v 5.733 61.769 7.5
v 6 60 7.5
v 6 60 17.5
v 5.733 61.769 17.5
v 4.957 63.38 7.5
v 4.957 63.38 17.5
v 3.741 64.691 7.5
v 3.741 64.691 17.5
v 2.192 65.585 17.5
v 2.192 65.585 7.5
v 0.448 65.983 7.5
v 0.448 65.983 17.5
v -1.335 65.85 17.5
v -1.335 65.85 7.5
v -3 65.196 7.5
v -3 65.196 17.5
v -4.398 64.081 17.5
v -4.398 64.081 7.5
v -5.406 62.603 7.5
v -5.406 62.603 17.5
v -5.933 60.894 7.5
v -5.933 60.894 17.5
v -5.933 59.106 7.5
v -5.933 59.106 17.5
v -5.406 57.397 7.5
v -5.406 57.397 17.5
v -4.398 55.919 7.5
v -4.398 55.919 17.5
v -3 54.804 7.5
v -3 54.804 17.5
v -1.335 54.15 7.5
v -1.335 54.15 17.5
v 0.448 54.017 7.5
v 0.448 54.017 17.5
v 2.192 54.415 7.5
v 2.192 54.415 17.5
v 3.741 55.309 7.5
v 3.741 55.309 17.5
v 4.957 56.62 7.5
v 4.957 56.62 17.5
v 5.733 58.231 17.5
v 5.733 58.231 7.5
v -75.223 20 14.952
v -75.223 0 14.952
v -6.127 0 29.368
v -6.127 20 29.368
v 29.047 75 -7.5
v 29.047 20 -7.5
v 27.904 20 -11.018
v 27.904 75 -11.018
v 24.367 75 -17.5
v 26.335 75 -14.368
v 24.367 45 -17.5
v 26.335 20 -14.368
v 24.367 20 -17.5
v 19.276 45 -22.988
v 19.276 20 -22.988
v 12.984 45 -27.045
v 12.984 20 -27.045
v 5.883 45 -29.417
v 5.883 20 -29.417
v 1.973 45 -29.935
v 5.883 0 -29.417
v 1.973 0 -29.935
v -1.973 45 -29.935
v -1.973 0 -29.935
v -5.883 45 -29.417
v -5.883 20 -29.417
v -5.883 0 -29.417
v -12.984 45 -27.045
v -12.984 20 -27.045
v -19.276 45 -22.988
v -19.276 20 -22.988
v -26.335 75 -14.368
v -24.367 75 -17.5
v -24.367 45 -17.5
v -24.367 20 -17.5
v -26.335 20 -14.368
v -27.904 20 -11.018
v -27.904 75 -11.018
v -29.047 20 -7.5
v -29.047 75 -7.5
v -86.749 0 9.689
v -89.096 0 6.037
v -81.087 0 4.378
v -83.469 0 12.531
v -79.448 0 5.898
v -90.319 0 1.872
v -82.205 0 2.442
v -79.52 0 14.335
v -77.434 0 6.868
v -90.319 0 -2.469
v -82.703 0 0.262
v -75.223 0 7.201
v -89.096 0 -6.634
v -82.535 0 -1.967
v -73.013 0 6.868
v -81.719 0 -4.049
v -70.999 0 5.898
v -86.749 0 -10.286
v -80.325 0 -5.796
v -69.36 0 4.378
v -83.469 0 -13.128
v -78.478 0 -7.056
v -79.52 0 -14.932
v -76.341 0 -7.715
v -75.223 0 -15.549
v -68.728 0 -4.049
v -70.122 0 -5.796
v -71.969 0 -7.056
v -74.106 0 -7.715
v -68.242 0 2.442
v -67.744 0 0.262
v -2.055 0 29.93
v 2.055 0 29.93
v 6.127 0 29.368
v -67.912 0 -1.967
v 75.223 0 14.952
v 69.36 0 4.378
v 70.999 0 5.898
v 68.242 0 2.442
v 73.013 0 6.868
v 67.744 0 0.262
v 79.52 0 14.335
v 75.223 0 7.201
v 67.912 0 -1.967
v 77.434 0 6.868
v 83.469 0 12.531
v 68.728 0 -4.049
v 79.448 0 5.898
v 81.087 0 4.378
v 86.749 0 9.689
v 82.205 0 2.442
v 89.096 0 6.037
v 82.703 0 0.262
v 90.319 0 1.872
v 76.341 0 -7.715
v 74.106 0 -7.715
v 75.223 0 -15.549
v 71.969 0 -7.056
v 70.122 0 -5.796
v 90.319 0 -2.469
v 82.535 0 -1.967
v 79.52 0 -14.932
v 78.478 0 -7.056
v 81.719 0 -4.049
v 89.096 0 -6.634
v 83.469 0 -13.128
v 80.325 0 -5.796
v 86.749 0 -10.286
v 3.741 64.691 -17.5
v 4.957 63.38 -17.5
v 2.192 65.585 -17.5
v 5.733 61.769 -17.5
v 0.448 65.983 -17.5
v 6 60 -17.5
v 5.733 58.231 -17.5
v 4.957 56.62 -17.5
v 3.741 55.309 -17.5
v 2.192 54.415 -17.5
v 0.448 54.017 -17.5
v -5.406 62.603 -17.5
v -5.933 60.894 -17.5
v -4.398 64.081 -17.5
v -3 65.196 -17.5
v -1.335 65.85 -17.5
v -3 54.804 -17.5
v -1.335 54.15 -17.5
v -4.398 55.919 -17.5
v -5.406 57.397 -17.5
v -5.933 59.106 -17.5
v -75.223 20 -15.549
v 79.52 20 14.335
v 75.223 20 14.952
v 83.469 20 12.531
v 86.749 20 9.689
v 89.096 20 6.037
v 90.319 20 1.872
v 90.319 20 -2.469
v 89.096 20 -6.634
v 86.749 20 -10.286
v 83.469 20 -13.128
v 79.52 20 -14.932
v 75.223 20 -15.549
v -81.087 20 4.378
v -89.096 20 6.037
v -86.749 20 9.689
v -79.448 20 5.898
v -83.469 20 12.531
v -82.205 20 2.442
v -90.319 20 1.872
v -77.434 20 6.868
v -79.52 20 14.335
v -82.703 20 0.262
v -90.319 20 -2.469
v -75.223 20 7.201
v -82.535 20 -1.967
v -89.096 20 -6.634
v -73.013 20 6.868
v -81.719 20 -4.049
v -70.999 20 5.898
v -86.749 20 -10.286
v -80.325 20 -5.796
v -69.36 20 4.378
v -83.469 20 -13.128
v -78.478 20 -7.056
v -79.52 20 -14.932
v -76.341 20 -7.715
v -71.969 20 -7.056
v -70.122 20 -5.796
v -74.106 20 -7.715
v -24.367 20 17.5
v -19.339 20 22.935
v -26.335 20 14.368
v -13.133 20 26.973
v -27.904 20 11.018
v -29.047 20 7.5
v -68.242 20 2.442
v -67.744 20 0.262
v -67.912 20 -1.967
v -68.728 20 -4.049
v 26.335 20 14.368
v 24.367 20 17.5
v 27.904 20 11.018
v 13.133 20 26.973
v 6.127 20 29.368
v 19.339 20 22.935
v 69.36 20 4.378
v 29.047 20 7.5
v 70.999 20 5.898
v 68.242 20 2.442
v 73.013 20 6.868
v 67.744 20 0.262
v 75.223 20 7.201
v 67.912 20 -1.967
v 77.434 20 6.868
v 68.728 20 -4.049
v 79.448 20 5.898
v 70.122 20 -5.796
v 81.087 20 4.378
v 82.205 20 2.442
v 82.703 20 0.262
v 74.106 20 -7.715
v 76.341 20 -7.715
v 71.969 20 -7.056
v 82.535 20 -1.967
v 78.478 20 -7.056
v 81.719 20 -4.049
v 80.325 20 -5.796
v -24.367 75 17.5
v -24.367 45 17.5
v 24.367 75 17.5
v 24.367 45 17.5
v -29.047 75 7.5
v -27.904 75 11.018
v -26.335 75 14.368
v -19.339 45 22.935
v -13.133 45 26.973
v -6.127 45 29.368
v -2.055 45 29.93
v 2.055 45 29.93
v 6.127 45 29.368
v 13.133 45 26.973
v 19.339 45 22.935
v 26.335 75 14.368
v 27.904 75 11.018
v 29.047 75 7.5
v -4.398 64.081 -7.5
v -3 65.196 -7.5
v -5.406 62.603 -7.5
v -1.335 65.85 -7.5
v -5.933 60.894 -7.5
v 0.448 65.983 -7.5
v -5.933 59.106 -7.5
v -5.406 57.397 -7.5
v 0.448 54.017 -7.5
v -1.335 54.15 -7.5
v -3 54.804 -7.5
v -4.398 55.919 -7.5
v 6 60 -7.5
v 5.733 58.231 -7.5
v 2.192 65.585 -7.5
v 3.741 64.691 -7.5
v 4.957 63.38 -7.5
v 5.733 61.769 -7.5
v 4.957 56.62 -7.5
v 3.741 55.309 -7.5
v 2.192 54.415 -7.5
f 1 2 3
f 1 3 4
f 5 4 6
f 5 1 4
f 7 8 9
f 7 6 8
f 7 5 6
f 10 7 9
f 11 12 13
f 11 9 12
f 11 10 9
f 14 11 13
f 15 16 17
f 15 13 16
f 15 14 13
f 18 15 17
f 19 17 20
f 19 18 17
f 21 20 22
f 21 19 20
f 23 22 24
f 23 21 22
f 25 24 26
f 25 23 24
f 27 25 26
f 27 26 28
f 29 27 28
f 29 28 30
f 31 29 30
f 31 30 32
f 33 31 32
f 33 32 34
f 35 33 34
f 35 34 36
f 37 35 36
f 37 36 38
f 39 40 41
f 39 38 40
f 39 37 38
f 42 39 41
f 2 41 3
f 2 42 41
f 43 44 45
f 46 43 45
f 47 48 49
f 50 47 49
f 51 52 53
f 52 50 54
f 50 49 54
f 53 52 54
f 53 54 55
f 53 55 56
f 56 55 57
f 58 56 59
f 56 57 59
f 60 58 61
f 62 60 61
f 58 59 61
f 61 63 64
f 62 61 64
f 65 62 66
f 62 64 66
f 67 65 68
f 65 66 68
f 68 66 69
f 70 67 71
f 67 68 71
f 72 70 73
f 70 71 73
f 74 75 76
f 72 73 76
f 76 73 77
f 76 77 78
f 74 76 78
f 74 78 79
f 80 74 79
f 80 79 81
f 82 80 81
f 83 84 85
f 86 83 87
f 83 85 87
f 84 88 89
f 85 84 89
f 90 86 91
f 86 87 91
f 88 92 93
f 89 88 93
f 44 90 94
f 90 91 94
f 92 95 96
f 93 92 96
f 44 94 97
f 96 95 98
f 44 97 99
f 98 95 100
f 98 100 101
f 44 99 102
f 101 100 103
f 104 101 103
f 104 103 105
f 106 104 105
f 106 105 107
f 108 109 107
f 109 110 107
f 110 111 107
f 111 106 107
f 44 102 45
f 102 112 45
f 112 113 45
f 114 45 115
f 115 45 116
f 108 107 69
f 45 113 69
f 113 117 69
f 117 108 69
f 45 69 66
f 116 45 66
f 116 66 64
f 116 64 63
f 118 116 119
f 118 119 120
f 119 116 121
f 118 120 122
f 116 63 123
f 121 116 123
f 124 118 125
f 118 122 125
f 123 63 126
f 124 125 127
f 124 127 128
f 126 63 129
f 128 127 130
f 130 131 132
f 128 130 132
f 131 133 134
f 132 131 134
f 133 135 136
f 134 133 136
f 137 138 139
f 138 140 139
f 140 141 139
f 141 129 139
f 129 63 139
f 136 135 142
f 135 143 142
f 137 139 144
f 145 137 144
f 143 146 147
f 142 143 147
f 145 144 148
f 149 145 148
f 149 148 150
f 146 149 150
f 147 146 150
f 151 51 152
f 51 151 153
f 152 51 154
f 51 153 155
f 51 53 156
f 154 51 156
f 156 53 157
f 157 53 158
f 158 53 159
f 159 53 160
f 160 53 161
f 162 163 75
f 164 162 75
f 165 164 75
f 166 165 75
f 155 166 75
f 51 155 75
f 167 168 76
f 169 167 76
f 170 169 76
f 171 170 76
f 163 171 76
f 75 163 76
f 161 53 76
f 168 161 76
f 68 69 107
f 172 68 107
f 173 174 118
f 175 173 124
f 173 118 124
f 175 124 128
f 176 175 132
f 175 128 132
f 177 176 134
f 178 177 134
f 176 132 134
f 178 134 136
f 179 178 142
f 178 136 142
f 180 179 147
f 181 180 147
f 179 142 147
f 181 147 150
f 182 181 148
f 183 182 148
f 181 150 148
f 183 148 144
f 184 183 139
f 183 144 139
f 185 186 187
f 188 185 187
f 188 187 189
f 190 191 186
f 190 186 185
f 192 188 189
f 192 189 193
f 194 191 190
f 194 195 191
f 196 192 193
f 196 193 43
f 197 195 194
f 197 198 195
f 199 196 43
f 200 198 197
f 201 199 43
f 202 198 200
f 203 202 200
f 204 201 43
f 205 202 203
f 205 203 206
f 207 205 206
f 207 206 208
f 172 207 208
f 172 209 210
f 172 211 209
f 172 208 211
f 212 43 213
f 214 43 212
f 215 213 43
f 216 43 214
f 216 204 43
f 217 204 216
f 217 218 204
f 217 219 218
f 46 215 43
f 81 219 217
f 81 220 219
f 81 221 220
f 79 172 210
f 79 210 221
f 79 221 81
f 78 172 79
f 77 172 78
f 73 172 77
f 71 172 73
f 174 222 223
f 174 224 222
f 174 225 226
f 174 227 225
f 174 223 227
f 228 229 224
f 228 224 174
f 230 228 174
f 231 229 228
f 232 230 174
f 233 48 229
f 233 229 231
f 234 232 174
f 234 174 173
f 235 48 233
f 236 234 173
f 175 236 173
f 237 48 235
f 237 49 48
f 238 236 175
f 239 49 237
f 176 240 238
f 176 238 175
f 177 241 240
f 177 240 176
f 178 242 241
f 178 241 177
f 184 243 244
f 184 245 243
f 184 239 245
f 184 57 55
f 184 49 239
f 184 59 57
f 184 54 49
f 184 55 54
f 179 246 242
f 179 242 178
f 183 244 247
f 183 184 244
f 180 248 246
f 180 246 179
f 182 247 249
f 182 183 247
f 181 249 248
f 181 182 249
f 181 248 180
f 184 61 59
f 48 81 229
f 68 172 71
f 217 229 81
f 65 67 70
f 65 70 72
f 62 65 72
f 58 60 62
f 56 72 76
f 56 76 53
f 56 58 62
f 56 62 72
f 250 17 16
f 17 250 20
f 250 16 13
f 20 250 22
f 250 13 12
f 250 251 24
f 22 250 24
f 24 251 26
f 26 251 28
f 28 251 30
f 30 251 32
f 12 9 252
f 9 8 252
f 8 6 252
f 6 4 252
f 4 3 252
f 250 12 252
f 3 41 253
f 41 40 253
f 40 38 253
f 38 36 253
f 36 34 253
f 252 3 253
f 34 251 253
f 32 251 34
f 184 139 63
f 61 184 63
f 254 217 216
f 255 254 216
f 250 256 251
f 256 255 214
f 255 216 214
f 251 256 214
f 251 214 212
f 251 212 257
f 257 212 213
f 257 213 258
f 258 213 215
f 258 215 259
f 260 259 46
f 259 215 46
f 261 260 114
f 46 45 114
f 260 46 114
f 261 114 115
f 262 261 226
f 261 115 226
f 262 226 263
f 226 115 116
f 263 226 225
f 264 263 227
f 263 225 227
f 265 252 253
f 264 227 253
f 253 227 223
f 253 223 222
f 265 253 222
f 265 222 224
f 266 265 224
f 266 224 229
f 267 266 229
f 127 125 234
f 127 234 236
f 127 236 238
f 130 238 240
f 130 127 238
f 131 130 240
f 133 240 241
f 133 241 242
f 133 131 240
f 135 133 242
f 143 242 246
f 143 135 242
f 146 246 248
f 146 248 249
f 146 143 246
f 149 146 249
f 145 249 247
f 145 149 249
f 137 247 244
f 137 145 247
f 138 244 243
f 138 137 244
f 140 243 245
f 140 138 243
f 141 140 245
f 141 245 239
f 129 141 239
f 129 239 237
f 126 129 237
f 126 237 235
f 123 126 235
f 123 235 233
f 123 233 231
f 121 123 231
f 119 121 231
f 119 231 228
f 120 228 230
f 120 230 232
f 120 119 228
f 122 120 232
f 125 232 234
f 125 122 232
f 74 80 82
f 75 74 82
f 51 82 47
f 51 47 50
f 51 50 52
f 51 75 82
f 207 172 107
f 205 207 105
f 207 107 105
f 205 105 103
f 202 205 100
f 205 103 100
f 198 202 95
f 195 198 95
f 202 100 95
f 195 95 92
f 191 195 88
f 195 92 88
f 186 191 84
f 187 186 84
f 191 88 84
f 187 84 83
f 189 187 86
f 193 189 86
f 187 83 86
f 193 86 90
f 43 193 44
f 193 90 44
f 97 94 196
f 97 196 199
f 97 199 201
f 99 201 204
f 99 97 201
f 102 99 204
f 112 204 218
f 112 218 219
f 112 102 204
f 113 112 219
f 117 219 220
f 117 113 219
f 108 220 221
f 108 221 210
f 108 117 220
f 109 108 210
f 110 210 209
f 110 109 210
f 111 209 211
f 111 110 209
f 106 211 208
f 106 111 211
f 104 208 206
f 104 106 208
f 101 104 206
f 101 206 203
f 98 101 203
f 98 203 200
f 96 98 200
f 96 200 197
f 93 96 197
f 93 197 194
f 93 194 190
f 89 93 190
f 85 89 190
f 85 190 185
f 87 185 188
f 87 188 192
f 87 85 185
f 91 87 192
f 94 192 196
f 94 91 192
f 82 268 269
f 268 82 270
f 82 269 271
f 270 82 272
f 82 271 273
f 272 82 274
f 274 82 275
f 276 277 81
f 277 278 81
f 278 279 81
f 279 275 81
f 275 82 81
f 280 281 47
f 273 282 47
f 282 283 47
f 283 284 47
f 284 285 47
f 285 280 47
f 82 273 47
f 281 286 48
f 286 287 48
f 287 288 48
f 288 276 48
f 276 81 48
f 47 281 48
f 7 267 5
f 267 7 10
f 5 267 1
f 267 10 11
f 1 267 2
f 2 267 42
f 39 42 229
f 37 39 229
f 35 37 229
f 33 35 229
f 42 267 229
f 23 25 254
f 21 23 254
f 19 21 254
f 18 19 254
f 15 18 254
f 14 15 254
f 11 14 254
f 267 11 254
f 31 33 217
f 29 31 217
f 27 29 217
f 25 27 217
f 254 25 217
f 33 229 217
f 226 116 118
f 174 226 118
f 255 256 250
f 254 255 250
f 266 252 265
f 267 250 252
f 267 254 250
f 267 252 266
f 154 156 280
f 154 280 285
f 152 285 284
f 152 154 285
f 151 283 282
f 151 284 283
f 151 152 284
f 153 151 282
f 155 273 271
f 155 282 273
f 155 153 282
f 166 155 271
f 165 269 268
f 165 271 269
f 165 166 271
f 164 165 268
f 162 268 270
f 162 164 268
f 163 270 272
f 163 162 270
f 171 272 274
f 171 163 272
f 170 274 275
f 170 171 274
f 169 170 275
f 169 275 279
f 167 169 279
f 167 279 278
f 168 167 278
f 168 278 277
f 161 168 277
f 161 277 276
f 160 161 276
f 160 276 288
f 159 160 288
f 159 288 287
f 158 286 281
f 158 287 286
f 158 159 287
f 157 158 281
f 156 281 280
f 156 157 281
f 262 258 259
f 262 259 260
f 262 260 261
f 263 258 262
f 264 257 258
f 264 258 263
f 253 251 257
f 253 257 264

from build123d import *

# Parameters (mm, degrees)
CROQUIS2_R                 = 7.5
SALIENTE_EXTRUIR1_DEPTH    = 20
SALIENTE_EXTRUIR2_START    = 20
SALIENTE_EXTRUIR2_DEPTH    = 25
SALIENTE_EXTRUIR3_START    = 45
SALIENTE_EXTRUIR3_DEPTH    = 30
CORTAR_EXTRUIR1_DEPTH      = 122.287306133
CORTAR_EXTRUIR1_DEPTH_BACK = 122.287306133
CROQUIS4_R                 = 6


with BuildPart() as part:
    # Croquis2 → Saliente-Extruir1 (new body)
    # profile 1 of 5: a face of its own
    with BuildSketch(Plane(origin=(0, 0, 0), x_dir=(1, 0, 0), z_dir=(0, 1, 0))):
        with BuildLine():
            ThreePointArc((-75.223489404, 15.549419201), (-90.474364485, 0.29854412), (-75.223489404, -14.952330962))
            Line((-75.223489404, -14.952330962), (-6.126869665, -29.367694293))
            ThreePointArc((-6.126869665, -29.367694293), (-16.360909149, -25.145986793), (-24.366985862, -17.5))
            ThreePointArc((-24.366985862, -17.5), (-27.171188586, -12.717173855), (-29.047375097, -7.5))
            Line((-29.047375097, -7.5), (29.047375097, -7.5))
            ThreePointArc((29.047375097, -7.5), (27.171188586, -12.717173855), (24.366985862, -17.5))
            ThreePointArc((24.366985862, -17.5), (16.360909149, -25.145986793), (6.126869665, -29.367694293))
            Line((6.126869665, -29.367694293), (75.223489404, -14.952330962))
            ThreePointArc((75.223489404, -14.952330962), (90.474364485, 0.29854412), (75.223489404, 15.549419201))
            Line((75.223489404, 15.549419201), (5.883484054, 29.417420271))
            ThreePointArc((5.883484054, 29.417420271), (16.256658913, 25.213509097), (24.366985862, 17.5))
            ThreePointArc((24.366985862, 17.5), (27.171188586, 12.717173855), (29.047375097, 7.5))
            Line((29.047375097, 7.5), (-29.047375097, 7.5))
            ThreePointArc((-29.047375097, 7.5), (-27.171188586, 12.717173855), (-24.366985862, 17.5))
            ThreePointArc((-24.366985862, 17.5), (-16.256658913, 25.213509097), (-5.883484054, 29.417420271))
            Line((-5.883484054, 29.417420271), (-75.223489404, 15.549419201))
        make_face()
        with Locations(Location((-75.223489404, 0.29854412, 0), (0, 0, 270))):
            Circle(CROQUIS2_R, mode=Mode.SUBTRACT)
        with Locations(Location((75.223489404, 0.29854412, 0), (0, 0, 270))):
            Circle(CROQUIS2_R, mode=Mode.SUBTRACT)
    # profile 2 of 5: a face of its own
    with BuildSketch(Plane(origin=(0, 0, 0), x_dir=(1, 0, 0), z_dir=(0, 1, 0))):
        with BuildLine():
            ThreePointArc((-24.366985862, -17.5), (-16.360909149, -25.145986793), (-6.126869665, -29.367694293))
            ThreePointArc((-6.126869665, -29.367694293), (0, -30), (6.126869665, -29.367694293))
            ThreePointArc((6.126869665, -29.367694293), (16.360909149, -25.145986793), (24.366985862, -17.5))
            Line((24.366985862, -17.5), (-24.366985862, -17.5))
        make_face()
    # profile 3 of 5: a face of its own
    with BuildSketch(Plane(origin=(0, 0, 0), x_dir=(1, 0, 0), z_dir=(0, 1, 0))):
        with BuildLine():
            ThreePointArc((-29.047375097, -7.5), (-27.171188586, -12.717173855), (-24.366985862, -17.5))
            Line((-24.366985862, -17.5), (24.366985862, -17.5))
            ThreePointArc((24.366985862, -17.5), (27.171188586, -12.717173855), (29.047375097, -7.5))
            Line((29.047375097, -7.5), (-29.047375097, -7.5))
        make_face()
    # profile 4 of 5: a face of its own
    with BuildSketch(Plane(origin=(0, 0, 0), x_dir=(1, 0, 0), z_dir=(0, 1, 0))):
        with BuildLine():
            Line((24.366985862, 17.5), (-24.366985862, 17.5))
            ThreePointArc((-24.366985862, 17.5), (-27.171188586, 12.717173855), (-29.047375097, 7.5))
            Line((-29.047375097, 7.5), (29.047375097, 7.5))
            ThreePointArc((29.047375097, 7.5), (27.171188586, 12.717173855), (24.366985862, 17.5))
        make_face()
    # profile 5 of 5: a face of its own
    with BuildSketch(Plane(origin=(0, 0, 0), x_dir=(1, 0, 0), z_dir=(0, 1, 0))):
        with BuildLine():
            ThreePointArc((5.883484054, 29.417420271), (0, 30), (-5.883484054, 29.417420271))
            ThreePointArc((-5.883484054, 29.417420271), (-16.256658913, 25.213509097), (-24.366985862, 17.5))
            Line((-24.366985862, 17.5), (24.366985862, 17.5))
            ThreePointArc((24.366985862, 17.5), (16.256658913, 25.213509097), (5.883484054, 29.417420271))
        make_face()
    extrude(amount=SALIENTE_EXTRUIR1_DEPTH)

    # Croquis2<3> → Saliente-Extruir2 (add)
    with BuildSketch(Plane(origin=(0, 0, 0), x_dir=(1, 0, 0), z_dir=(0, 1, 0)).offset(SALIENTE_EXTRUIR2_START)):
        with BuildLine():
            ThreePointArc((-24.366985862, -17.5), (-16.360909149, -25.145986793), (-6.126869665, -29.367694293))
            ThreePointArc((-6.126869665, -29.367694293), (0, -30), (6.126869665, -29.367694293))
            ThreePointArc((6.126869665, -29.367694293), (16.360909149, -25.145986793), (24.366985862, -17.5))
            Line((24.366985862, -17.5), (-24.366985862, -17.5))
        make_face()
        with BuildLine():
            ThreePointArc((-29.047375097, -7.5), (-27.171188586, -12.717173855), (-24.366985862, -17.5))
            Line((-24.366985862, -17.5), (24.366985862, -17.5))
            ThreePointArc((24.366985862, -17.5), (27.171188586, -12.717173855), (29.047375097, -7.5))
            Line((29.047375097, -7.5), (-29.047375097, -7.5))
        make_face()
        with BuildLine():
            Line((24.366985862, 17.5), (-24.366985862, 17.5))
            ThreePointArc((-24.366985862, 17.5), (-27.171188586, 12.717173855), (-29.047375097, 7.5))
            Line((-29.047375097, 7.5), (29.047375097, 7.5))
            ThreePointArc((29.047375097, 7.5), (27.171188586, 12.717173855), (24.366985862, 17.5))
        make_face()
        with BuildLine():
            ThreePointArc((5.883484054, 29.417420271), (0, 30), (-5.883484054, 29.417420271))
            ThreePointArc((-5.883484054, 29.417420271), (-16.256658913, 25.213509097), (-24.366985862, 17.5))
            Line((-24.366985862, 17.5), (24.366985862, 17.5))
            ThreePointArc((24.366985862, 17.5), (16.256658913, 25.213509097), (5.883484054, 29.417420271))
        make_face()
    extrude(amount=SALIENTE_EXTRUIR2_DEPTH)

    # Croquis2<4> → Saliente-Extruir3 (add)
    with BuildSketch(Plane(origin=(0, 0, 0), x_dir=(1, 0, 0), z_dir=(0, 1, 0)).offset(SALIENTE_EXTRUIR3_START)):
        with BuildLine():
            ThreePointArc((-29.047375097, -7.5), (-27.171188586, -12.717173855), (-24.366985862, -17.5))
            Line((-24.366985862, -17.5), (24.366985862, -17.5))
            ThreePointArc((24.366985862, -17.5), (27.171188586, -12.717173855), (29.047375097, -7.5))
            Line((29.047375097, -7.5), (-29.047375097, -7.5))
        make_face()
        with BuildLine():
            Line((24.366985862, 17.5), (-24.366985862, 17.5))
            ThreePointArc((-24.366985862, 17.5), (-27.171188586, 12.717173855), (-29.047375097, 7.5))
            Line((-29.047375097, 7.5), (29.047375097, 7.5))
            ThreePointArc((29.047375097, 7.5), (27.171188586, 12.717173855), (24.366985862, 17.5))
        make_face()
    extrude(amount=SALIENTE_EXTRUIR3_DEPTH)

    # Croquis4 → Cortar-Extruir1 (cut, two sides: drawn at the far end of the back side and taken through both)
    with BuildSketch(Plane.XY.offset(-CORTAR_EXTRUIR1_DEPTH_BACK)):
        with Locations((0, 60)):
            Circle(CROQUIS4_R)
    extrude(amount=CORTAR_EXTRUIR1_DEPTH + CORTAR_EXTRUIR1_DEPTH_BACK, mode=Mode.SUBTRACT)


solid = part.part
